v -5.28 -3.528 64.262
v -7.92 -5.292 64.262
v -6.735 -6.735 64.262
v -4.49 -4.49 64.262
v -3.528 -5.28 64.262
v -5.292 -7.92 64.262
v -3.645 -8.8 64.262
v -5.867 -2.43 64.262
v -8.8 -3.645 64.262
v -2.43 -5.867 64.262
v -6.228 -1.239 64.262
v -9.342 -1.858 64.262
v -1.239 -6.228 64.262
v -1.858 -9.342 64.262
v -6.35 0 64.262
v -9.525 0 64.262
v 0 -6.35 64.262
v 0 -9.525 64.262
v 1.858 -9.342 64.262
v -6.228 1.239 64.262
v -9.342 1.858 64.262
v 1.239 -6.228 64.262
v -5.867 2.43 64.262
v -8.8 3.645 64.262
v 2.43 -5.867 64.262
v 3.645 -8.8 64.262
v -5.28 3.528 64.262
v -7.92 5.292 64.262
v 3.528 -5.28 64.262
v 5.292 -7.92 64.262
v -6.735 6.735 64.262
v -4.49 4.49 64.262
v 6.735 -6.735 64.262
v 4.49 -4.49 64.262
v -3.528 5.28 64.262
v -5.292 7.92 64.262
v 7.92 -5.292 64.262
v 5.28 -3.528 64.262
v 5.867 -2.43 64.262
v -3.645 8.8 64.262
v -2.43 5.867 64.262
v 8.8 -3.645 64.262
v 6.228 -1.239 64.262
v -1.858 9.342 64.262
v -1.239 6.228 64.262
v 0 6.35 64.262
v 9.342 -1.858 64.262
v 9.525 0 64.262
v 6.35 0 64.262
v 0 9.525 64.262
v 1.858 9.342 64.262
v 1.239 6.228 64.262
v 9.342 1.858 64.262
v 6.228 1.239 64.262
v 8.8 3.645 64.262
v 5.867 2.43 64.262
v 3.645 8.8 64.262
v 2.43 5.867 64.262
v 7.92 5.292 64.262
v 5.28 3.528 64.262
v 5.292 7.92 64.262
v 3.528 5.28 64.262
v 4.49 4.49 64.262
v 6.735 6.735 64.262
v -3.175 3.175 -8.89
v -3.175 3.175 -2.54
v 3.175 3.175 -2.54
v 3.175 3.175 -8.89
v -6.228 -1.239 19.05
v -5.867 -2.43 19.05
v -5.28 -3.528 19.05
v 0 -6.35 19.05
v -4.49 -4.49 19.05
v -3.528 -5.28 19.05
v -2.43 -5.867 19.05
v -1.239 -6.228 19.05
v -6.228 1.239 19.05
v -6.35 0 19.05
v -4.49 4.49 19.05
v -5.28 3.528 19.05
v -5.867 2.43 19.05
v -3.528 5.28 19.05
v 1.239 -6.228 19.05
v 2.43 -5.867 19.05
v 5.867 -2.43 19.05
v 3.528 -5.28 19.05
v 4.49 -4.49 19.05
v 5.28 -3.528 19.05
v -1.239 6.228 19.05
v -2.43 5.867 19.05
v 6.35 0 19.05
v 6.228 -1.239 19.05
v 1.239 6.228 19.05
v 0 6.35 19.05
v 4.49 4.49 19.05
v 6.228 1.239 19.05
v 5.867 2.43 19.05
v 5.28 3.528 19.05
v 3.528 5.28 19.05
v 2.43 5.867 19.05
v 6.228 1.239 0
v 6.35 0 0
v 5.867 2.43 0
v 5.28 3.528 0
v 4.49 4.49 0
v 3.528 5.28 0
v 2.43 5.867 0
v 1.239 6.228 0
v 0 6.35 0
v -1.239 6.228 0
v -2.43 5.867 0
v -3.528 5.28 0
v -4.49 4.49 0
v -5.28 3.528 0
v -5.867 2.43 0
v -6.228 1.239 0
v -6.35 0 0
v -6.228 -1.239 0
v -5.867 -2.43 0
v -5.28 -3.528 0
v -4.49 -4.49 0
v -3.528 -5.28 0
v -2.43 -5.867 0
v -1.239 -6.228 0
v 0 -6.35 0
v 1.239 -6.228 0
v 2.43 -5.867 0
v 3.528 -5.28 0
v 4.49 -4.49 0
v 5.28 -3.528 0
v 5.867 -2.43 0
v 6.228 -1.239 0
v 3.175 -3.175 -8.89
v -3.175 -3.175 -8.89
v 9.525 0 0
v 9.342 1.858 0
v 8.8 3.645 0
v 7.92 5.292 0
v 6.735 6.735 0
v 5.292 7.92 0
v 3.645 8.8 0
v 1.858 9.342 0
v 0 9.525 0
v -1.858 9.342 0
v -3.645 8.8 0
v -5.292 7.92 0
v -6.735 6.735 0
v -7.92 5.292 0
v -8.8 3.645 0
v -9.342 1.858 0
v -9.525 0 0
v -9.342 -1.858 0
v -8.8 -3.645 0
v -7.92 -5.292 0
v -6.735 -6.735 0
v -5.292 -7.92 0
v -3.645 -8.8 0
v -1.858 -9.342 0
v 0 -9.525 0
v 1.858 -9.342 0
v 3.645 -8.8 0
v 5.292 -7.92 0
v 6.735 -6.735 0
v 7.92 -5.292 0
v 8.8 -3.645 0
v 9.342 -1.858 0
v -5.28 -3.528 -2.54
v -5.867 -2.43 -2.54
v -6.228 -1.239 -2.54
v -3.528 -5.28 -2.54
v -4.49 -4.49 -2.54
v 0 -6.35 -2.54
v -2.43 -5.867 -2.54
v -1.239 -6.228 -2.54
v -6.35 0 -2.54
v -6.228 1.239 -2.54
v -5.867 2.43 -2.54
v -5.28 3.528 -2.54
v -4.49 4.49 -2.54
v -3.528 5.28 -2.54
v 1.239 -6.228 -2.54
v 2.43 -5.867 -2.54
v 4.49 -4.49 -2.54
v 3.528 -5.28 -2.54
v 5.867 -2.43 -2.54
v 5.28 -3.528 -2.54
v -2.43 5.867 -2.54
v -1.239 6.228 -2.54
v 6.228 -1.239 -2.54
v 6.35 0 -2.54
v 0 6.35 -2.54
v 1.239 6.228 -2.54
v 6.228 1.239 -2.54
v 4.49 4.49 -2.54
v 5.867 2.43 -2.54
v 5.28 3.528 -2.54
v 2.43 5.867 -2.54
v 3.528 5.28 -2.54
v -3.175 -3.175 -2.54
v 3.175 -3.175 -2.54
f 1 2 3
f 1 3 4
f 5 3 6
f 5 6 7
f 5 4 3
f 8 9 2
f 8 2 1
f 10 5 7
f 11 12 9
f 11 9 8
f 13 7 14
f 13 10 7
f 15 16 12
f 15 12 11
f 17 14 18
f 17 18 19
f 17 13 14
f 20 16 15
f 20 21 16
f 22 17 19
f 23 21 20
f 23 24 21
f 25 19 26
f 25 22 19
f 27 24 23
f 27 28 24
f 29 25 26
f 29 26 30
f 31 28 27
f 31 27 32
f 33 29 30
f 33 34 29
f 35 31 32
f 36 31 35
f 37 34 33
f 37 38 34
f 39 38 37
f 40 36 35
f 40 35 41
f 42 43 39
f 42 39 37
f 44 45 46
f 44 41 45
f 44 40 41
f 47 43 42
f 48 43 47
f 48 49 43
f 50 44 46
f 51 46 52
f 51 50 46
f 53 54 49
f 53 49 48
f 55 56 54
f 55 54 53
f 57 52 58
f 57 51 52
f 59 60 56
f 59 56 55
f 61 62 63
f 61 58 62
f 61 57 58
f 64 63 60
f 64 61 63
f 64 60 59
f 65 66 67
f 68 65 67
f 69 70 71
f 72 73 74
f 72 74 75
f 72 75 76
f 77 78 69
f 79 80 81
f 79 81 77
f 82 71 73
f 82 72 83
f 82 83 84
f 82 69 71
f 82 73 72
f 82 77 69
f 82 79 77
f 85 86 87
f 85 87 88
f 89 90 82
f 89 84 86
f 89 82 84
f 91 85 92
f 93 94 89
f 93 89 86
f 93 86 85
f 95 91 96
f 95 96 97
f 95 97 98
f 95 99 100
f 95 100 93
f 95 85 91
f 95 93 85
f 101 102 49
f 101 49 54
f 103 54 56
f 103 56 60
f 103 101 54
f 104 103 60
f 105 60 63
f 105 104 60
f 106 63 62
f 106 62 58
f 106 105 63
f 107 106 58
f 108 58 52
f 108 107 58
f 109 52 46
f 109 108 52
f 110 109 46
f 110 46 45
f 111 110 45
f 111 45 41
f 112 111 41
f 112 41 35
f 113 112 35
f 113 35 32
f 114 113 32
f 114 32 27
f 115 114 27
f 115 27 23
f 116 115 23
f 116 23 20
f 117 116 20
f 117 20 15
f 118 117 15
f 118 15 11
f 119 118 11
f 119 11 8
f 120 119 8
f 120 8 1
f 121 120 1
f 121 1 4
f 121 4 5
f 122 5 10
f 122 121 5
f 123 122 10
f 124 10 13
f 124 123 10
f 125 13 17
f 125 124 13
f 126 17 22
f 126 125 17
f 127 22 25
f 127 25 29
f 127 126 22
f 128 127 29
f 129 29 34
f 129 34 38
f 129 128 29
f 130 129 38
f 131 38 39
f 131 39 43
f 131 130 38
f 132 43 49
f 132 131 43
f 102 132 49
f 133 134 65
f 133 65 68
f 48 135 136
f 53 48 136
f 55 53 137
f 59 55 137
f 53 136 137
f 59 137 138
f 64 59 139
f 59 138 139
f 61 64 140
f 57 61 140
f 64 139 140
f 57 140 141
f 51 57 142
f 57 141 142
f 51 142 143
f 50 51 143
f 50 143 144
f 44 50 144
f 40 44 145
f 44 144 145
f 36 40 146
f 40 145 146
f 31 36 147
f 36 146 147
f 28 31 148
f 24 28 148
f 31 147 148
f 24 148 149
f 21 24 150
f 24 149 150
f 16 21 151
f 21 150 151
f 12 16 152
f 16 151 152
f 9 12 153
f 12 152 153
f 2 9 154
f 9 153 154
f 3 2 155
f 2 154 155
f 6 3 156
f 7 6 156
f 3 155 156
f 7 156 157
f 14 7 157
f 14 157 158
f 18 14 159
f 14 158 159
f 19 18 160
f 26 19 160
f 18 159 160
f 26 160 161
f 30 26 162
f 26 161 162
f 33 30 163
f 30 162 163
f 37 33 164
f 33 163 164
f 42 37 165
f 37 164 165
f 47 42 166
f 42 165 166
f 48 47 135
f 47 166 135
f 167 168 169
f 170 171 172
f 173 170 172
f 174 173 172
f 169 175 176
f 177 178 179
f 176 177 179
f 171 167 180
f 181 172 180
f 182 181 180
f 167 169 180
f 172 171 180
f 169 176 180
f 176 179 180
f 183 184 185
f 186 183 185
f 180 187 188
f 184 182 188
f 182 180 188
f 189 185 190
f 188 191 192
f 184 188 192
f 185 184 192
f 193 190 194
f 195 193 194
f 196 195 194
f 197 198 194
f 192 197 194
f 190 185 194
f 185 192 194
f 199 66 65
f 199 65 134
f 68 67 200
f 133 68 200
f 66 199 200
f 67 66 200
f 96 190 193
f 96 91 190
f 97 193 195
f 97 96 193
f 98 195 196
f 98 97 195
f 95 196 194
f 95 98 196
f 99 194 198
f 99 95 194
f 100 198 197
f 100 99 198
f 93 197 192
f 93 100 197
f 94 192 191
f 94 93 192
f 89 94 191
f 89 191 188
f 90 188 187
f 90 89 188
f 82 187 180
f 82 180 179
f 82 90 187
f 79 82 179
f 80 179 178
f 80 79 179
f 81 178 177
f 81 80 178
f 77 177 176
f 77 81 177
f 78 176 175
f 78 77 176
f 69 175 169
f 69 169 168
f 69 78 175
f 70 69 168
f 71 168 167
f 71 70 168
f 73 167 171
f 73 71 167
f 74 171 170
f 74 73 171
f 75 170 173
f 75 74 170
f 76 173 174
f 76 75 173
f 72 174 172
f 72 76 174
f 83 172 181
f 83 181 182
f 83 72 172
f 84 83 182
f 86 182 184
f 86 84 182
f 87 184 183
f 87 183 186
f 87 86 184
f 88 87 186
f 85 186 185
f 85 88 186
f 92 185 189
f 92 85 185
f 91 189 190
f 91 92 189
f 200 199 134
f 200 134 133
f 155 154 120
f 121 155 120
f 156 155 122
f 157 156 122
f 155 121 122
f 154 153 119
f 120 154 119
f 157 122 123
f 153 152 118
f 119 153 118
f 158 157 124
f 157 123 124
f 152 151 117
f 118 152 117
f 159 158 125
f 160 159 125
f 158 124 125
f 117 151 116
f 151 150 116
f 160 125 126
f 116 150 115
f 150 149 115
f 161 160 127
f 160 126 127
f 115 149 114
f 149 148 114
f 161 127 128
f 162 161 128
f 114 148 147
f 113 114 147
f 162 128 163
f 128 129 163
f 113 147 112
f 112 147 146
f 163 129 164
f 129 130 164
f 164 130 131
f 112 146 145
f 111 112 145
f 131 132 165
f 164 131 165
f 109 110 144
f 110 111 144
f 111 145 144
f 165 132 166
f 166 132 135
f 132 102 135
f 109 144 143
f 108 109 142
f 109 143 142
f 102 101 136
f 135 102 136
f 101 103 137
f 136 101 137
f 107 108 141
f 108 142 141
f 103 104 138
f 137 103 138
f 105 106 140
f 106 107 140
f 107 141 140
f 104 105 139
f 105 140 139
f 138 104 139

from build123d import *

# Parameters (mm, degrees)
F0_R          = 9.525
F0_R_2        = 6.35
F1_DEPTH      = 64.262
F2_R          = 6.35
F3_DEPTH      = 63.5
F4_DEPTH      = 19.05
F4_DEPTH_BACK = 2.54
F5_W          = 6.35
F5_H          = 6.35
F6_DEPTH      = 6.35


with BuildPart() as f1:
    # F0 (on Top) → F1 (new body)
    with BuildSketch(Plane.XY):
        Circle(F0_R)
        Circle(F0_R_2, mode=Mode.SUBTRACT)
    extrude(amount=F1_DEPTH)

    # F2 (on face) → F3 (cut)
    with BuildSketch(Plane.XY.offset(64.262)):
        Circle(F2_R)
    extrude(amount=-F3_DEPTH, mode=Mode.SUBTRACT)


with BuildPart() as f4:
    # F0 (on Top) → F4 (new body, two sides)
    with BuildSketch(Plane.XY) as f4_sk:
        Circle(F0_R_2)
    extrude(amount=F4_DEPTH)
    extrude(f4_sk.sketch, amount=-F4_DEPTH_BACK)


with BuildPart() as f6:
    # F5 (on face) → F6 (new body)
    with BuildSketch(Plane(origin=(0, 0, -2.54), x_dir=(1, 0, 0), z_dir=(0, 0, -1))):
        Rectangle(F5_W, F5_H)
    extrude(amount=F6_DEPTH)


solid = Compound([f1.part, f4.part, f6.part])
